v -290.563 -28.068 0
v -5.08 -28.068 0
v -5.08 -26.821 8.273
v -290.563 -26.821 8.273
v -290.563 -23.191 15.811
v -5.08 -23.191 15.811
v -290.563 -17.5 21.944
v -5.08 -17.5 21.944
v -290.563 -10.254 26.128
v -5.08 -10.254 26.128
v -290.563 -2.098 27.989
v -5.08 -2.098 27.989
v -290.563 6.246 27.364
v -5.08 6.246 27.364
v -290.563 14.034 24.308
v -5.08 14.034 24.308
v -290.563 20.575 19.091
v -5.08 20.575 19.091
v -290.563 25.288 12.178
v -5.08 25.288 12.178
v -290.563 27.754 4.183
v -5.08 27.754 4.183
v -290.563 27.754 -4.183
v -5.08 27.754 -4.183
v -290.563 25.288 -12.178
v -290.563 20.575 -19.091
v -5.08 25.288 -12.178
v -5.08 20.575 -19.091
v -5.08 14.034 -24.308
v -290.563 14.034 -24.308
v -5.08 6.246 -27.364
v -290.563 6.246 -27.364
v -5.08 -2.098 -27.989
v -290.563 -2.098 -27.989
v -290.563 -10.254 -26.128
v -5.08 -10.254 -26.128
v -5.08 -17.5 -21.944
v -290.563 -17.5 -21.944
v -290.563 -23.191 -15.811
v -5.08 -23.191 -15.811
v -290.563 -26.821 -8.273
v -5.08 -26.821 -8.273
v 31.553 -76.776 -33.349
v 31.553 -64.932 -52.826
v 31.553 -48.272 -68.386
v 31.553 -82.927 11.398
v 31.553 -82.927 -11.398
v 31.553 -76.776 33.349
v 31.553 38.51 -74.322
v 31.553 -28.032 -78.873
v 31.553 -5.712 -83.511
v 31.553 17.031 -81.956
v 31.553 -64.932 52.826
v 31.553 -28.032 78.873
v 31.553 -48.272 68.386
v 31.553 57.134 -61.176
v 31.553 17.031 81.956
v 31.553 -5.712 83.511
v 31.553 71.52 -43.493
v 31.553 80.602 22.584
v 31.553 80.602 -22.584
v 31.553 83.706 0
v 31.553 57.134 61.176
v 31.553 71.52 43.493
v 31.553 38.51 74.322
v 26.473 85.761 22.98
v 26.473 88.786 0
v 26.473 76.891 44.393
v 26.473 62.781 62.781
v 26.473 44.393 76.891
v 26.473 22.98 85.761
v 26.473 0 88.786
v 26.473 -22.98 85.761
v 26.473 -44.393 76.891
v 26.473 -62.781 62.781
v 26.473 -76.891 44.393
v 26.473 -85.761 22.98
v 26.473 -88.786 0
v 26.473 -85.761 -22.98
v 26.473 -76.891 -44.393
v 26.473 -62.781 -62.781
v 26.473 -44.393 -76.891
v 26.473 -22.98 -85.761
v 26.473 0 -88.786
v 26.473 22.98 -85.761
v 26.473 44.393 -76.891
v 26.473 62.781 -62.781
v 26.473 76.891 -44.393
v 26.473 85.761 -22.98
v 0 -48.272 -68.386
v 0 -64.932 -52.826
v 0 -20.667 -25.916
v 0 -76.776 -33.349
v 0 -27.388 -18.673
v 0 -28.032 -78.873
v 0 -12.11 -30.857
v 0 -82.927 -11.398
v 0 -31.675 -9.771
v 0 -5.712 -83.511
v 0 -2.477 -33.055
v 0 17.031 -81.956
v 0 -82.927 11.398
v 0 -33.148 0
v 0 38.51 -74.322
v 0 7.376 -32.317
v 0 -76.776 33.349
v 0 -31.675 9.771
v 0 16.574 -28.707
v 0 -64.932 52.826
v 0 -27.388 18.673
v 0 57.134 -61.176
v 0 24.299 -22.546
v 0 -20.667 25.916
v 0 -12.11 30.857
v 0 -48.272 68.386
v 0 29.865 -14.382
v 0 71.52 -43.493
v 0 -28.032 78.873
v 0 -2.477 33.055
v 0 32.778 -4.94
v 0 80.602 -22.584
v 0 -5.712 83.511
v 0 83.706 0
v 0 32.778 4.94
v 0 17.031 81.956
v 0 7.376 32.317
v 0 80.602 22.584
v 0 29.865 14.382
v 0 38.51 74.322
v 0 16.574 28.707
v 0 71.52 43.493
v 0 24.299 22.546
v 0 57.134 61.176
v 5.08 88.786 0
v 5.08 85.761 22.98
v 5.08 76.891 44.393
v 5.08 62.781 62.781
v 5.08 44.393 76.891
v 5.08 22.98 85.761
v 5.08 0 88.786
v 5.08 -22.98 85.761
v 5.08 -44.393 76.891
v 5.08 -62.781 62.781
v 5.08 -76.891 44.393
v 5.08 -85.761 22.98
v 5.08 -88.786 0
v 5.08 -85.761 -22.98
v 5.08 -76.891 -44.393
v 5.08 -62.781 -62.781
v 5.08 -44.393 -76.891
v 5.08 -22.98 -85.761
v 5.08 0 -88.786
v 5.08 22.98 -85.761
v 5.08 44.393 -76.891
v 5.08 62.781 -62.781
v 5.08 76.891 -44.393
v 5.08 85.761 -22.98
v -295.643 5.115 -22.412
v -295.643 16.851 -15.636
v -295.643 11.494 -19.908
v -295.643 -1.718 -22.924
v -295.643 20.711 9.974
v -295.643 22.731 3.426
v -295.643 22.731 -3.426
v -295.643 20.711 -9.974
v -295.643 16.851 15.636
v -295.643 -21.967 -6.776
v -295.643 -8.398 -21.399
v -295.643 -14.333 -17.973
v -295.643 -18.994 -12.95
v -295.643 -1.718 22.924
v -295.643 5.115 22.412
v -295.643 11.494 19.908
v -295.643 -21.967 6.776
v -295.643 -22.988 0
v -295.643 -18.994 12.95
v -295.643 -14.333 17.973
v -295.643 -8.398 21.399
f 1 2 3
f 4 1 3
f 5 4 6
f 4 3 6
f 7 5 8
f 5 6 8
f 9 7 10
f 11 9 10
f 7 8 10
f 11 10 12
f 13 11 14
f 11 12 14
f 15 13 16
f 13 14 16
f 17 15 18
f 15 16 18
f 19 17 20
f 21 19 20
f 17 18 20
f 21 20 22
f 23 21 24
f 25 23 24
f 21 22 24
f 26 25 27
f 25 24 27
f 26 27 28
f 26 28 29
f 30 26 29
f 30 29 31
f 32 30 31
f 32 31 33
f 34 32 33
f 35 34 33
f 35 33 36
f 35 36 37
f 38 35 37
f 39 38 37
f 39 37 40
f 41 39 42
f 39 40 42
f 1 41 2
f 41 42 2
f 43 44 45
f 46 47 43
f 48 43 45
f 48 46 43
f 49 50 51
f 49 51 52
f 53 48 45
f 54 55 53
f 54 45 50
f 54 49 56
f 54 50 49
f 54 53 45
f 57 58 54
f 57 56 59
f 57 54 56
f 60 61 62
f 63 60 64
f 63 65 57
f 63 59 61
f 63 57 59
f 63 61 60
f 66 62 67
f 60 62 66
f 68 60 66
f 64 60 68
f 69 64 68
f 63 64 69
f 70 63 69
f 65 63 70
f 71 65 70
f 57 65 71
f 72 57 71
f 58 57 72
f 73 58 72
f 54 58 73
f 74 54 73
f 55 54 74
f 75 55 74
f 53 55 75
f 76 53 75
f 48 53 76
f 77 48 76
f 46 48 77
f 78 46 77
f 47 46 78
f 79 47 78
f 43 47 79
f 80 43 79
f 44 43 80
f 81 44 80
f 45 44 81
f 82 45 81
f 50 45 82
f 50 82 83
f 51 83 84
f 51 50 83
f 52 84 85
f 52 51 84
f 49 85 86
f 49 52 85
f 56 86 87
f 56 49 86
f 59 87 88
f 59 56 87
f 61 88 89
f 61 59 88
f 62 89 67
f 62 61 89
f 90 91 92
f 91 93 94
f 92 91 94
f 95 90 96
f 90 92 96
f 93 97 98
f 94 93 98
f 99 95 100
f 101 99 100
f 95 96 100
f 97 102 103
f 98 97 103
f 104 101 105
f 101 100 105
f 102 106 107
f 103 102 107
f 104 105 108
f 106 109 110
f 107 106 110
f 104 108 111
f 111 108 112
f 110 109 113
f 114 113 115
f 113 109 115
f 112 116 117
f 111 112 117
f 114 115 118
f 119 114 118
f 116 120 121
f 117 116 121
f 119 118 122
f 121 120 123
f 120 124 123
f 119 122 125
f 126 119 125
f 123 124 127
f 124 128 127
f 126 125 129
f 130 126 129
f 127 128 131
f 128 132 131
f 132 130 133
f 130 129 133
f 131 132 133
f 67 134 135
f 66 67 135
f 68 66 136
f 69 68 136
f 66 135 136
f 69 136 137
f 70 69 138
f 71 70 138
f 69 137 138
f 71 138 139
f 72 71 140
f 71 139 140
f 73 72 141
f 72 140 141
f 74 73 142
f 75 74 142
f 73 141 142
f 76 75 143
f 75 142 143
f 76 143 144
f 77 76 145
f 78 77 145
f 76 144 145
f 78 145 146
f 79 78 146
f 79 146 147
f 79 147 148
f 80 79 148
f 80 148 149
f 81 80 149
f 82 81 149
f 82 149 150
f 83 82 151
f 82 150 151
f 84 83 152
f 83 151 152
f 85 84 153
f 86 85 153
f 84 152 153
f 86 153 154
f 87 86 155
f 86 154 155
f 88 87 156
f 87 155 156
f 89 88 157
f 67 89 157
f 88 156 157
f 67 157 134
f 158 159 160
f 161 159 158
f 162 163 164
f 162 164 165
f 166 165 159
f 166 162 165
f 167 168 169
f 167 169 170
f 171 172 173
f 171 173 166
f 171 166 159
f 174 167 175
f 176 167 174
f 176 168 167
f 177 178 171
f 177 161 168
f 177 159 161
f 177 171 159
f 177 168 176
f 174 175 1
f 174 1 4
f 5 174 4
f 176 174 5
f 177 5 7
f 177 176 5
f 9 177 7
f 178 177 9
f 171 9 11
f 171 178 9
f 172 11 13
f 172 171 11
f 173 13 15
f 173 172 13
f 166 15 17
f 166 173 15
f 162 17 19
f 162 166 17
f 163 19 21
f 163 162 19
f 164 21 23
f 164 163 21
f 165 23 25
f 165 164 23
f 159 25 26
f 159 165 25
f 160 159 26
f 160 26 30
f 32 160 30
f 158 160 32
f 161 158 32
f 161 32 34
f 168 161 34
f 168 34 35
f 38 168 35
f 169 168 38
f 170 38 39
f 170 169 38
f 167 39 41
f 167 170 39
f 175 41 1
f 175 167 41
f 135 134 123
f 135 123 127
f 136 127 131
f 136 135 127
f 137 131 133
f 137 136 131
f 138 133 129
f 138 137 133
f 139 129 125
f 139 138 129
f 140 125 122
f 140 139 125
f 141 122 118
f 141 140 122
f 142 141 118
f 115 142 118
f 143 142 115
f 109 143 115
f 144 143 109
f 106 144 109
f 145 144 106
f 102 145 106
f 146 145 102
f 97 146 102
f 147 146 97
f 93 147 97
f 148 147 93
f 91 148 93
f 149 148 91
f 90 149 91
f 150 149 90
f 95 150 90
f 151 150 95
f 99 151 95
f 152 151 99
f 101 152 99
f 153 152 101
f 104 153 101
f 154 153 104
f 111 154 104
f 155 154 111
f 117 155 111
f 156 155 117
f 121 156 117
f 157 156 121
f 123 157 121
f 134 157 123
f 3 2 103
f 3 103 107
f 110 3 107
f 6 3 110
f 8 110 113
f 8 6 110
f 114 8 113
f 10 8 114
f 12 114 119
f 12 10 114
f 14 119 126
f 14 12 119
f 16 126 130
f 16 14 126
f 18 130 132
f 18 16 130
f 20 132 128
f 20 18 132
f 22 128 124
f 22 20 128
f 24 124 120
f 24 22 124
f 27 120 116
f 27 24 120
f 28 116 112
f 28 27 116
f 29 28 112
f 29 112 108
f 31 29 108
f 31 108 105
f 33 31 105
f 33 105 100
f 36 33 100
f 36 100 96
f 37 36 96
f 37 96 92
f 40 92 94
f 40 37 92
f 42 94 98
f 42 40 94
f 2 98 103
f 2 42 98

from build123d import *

# Parameters (mm, degrees)
F0_R     = 88.786402
F1_DEPTH = 31.552652
F2_R     = 28.067948
F3_DEPTH = 295.643002
F4_SIZE  = 5.08
F5_SIZE  = 5.08


with BuildPart() as f1:
    # F0 (on Right) → F1 (new body)
    with BuildSketch(Plane.YZ):
        Circle(F0_R)
    extrude(amount=F1_DEPTH)

    # F2 (on face) → F3 (join)
    with BuildSketch(Plane(origin=(0, 0, 0), x_dir=(0, -1, 0), z_dir=(-1, 0, 0))):
        Circle(F2_R)
    extrude(amount=F3_DEPTH)

    # F4
    f4_edges = [f1.edges().sort_by_distance(p)[0] for p in [
        (-147.821501, -28.067948, 0),
        (0, 28.067948, 0),
        (-295.643002, 28.067948, 0),
    ]]
    chamfer(f4_edges, length=F4_SIZE)

    # F5
    f5_edges = [f1.edges().sort_by_distance(p)[0] for p in [
        (31.552652, -88.786402, 0),
        (0, -88.786402, 0),
    ]]
    chamfer(f5_edges, length=F5_SIZE)


solid = f1.part
